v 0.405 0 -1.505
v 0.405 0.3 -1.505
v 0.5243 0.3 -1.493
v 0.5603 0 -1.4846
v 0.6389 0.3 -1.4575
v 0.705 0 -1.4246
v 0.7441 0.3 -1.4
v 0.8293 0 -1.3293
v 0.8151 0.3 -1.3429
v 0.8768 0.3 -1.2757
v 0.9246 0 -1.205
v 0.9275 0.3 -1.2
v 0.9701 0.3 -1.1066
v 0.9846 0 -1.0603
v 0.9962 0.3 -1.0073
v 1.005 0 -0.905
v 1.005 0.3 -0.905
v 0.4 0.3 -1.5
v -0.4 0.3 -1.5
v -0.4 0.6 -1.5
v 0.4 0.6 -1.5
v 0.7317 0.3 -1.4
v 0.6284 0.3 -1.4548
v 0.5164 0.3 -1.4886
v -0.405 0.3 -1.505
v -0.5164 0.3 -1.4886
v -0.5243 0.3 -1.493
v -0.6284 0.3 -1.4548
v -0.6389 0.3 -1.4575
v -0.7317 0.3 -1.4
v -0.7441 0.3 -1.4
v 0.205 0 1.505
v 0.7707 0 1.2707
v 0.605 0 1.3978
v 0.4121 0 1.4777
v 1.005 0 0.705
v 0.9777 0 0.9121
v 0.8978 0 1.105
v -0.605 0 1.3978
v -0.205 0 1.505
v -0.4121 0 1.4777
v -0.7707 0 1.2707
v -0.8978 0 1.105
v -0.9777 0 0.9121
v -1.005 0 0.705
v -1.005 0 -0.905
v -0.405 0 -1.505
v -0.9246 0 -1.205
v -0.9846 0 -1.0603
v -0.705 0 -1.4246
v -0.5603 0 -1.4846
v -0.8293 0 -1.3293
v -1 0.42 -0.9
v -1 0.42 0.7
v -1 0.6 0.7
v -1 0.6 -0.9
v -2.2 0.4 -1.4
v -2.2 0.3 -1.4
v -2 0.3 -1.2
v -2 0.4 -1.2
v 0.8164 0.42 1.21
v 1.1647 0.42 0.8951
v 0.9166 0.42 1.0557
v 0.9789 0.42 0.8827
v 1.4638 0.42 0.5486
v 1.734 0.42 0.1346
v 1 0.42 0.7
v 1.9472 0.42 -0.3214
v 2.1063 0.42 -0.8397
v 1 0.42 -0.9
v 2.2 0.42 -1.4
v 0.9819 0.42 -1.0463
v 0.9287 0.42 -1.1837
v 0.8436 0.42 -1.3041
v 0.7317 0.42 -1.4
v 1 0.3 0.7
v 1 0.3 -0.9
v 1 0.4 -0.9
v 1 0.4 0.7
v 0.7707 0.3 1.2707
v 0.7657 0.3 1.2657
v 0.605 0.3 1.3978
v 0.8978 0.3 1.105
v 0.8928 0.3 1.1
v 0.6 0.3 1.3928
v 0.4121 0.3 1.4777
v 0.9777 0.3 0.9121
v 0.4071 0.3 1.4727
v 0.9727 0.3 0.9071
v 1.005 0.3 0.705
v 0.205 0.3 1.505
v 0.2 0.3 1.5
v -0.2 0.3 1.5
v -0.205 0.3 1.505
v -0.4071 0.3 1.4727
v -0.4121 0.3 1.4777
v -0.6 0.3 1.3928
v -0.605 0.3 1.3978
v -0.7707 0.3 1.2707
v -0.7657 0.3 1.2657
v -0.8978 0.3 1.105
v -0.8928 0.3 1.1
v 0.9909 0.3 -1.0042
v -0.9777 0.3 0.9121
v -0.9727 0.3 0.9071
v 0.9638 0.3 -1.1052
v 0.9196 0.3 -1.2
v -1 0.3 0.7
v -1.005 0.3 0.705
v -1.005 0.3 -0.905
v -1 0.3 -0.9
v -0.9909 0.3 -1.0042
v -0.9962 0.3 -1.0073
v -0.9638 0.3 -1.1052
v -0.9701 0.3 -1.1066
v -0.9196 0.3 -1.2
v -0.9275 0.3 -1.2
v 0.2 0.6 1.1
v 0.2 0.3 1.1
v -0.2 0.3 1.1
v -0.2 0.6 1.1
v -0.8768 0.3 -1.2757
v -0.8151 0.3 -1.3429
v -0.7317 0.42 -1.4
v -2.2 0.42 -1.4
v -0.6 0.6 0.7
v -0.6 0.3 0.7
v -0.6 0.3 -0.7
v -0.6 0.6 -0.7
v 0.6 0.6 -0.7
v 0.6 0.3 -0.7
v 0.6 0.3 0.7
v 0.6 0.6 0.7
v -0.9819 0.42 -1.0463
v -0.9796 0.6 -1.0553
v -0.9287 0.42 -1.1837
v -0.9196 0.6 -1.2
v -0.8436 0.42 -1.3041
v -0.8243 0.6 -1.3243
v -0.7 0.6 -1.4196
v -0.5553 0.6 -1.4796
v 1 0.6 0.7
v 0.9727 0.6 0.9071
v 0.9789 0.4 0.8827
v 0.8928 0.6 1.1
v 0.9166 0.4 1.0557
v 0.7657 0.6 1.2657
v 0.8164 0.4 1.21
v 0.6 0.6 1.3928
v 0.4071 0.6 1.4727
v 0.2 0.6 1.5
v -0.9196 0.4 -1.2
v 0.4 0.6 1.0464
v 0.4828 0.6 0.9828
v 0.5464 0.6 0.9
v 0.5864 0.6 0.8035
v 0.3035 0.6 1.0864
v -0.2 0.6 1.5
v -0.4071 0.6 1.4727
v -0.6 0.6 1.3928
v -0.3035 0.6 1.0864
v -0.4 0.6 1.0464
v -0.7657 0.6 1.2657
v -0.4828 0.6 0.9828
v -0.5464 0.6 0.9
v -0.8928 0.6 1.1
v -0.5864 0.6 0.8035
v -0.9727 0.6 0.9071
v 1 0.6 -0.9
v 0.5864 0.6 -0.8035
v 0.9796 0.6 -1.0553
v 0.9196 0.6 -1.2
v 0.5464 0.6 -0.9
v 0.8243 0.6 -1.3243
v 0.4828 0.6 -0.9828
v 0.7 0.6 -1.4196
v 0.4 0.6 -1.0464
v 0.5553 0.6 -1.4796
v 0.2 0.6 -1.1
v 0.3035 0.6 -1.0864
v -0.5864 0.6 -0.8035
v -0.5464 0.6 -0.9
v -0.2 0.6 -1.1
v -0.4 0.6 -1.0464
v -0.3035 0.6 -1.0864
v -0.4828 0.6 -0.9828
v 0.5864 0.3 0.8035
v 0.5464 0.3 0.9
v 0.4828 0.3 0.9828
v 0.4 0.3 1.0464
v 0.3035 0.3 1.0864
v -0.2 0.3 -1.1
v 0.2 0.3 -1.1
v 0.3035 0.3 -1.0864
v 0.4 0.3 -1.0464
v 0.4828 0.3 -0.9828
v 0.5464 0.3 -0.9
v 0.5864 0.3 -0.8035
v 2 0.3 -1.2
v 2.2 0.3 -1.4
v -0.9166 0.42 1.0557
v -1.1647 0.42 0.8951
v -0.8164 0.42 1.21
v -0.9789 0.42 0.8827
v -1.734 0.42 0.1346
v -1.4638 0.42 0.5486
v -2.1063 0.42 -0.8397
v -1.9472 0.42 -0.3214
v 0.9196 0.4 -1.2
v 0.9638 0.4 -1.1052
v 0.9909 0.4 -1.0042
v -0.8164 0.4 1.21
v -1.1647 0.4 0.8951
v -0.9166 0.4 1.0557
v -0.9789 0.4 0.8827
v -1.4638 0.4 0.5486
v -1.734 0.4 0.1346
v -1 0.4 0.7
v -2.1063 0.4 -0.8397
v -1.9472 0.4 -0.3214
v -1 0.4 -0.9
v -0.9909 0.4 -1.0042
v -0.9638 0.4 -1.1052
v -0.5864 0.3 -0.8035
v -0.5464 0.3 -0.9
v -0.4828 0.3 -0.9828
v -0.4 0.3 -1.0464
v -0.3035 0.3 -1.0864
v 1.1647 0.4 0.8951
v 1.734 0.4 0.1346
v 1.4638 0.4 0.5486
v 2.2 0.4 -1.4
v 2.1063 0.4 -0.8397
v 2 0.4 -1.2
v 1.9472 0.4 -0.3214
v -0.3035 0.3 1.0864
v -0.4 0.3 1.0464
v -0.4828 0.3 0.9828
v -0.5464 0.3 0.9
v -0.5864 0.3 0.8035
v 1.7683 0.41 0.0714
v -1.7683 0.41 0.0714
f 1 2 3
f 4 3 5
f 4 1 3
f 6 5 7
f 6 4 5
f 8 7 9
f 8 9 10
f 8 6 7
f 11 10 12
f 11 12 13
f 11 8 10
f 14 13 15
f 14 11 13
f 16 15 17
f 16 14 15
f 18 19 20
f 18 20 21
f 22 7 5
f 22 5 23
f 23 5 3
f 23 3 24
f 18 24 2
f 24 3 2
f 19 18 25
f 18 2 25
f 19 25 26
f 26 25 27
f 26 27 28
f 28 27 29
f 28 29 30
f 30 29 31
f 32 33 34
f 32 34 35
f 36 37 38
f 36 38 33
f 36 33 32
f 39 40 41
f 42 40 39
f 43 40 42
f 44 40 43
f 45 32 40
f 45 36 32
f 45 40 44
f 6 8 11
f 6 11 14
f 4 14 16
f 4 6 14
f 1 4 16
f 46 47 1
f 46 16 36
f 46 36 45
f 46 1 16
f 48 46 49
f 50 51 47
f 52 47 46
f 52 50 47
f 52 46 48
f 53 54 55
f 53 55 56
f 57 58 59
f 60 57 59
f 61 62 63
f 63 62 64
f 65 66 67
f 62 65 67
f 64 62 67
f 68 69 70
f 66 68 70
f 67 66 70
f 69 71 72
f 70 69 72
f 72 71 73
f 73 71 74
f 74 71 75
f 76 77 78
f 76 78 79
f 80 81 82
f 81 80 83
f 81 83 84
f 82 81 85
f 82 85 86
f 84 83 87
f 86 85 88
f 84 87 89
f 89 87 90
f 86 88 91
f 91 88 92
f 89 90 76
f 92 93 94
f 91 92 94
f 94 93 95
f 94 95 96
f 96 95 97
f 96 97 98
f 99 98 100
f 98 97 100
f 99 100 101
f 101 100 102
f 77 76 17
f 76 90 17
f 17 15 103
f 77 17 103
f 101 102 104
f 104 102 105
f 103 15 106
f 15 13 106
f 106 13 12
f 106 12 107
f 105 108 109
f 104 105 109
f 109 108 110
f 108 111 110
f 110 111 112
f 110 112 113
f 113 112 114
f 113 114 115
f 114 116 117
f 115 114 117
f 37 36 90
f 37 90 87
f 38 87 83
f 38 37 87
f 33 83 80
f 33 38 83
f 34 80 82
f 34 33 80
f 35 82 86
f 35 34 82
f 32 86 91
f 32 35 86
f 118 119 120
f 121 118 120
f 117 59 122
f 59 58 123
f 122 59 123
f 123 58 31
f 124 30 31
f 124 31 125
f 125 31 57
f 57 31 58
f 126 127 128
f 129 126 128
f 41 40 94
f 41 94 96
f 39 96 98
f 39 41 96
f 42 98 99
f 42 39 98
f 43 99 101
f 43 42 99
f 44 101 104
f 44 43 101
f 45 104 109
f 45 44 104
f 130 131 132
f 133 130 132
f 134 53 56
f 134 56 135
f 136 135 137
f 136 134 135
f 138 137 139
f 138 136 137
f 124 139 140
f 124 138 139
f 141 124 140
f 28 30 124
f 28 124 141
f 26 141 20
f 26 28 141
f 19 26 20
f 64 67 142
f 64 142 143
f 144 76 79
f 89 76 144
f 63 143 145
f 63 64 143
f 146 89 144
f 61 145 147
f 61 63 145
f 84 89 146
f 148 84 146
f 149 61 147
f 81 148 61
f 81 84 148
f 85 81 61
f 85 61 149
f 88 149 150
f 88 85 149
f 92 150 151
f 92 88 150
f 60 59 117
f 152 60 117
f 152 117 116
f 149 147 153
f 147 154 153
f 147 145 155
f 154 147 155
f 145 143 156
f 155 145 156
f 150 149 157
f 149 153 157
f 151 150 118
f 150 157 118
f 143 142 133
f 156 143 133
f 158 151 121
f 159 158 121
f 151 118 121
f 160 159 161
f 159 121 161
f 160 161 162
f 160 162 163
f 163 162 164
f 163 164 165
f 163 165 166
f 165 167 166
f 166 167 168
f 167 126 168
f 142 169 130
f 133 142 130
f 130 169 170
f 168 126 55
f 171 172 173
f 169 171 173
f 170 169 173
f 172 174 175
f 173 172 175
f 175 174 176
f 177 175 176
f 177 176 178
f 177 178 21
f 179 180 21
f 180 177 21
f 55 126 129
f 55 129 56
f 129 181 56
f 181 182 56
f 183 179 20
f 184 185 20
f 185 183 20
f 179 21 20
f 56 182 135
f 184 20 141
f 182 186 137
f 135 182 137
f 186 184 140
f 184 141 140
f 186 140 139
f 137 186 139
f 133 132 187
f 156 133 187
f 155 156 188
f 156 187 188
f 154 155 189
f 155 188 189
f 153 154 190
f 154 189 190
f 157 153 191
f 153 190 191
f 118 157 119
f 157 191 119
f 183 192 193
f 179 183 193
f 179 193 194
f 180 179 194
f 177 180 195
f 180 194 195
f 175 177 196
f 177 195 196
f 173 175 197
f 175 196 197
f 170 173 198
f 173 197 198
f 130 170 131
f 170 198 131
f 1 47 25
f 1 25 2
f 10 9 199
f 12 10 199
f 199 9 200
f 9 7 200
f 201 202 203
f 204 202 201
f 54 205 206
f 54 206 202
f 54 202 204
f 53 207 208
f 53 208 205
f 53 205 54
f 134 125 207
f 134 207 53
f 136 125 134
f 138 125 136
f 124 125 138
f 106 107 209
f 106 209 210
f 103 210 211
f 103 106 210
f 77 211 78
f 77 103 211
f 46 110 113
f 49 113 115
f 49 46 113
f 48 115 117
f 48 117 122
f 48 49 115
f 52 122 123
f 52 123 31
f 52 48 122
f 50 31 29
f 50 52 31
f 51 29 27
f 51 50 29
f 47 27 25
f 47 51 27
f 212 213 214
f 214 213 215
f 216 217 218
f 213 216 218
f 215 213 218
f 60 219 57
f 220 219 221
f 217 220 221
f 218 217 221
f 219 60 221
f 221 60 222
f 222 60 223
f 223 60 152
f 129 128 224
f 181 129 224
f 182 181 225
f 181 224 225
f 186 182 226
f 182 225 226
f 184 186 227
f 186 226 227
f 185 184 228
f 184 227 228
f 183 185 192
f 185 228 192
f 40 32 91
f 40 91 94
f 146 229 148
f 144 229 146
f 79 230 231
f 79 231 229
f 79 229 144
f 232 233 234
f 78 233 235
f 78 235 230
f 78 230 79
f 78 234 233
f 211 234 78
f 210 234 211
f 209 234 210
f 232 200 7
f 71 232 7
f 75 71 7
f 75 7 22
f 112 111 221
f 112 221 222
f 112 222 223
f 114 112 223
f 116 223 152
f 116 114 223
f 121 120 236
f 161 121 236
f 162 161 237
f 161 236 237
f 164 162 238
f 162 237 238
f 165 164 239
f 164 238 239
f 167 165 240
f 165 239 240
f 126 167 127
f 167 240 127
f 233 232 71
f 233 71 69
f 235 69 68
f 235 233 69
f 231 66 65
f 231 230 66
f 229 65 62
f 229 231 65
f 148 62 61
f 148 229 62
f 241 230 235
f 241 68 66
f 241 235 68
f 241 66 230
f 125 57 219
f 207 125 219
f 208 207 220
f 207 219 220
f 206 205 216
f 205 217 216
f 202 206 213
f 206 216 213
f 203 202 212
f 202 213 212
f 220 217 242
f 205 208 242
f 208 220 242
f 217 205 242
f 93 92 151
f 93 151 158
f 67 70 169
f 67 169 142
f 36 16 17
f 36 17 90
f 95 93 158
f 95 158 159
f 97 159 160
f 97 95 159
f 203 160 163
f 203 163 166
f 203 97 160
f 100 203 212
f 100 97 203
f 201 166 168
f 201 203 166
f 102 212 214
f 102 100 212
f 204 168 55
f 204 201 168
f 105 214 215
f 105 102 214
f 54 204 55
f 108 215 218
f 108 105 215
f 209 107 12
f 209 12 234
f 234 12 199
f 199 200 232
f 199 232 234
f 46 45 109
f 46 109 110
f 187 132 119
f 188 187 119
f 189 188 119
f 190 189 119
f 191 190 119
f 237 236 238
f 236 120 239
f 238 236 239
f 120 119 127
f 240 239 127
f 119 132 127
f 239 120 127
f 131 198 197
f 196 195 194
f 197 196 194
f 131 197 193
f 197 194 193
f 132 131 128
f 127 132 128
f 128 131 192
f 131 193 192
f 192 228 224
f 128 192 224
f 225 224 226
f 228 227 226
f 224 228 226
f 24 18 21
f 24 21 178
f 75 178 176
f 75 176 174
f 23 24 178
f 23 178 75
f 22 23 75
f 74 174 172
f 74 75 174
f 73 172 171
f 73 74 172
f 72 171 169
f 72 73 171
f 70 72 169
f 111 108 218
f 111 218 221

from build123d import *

# Parameters (mm, degrees)
EXTRUDE_1_DEPTH = 3
SKETCH_2_W      = 2
SKETCH_2_H      = 22
EXTRUDE_2_DEPTH = 1
EXTRUDE_3_DEPTH = 0.2
EXTRUDE_4_DEPTH = 3
SCALE_1_SCALE   = 0.1


with BuildPart() as part:
    # 草图1 → 凸台-拉伸1 (new body)
    with BuildSketch(Plane(origin=(0, 0, 0), x_dir=(1, 0, 0), z_dir=(0, 1, 0))):
        with BuildLine():
            Line((-4.05, 15.05), (4.05, 15.05))
            ThreePointArc((4.05, 15.05), (8.292640687, 13.292640687), (10.05, 9.05))
            Line((10.05, 9.05), (10.05, -7.05))
            ThreePointArc((10.05, -7.05), (7.706854249, -12.706854249), (2.05, -15.05))
            Line((2.05, -15.05), (-2.05, -15.05))
            ThreePointArc((-2.05, -15.05), (-7.706854249, -12.706854249), (-10.05, -7.05))
            Line((-10.05, -7.05), (-10.05, 9.05))
            ThreePointArc((-10.05, 9.05), (-8.292640687, 13.292640687), (-4.05, 15.05))
        make_face()
    extrude(amount=EXTRUDE_1_DEPTH)

    # 草图2 → 凸台-拉伸2 (add)
    with BuildSketch(Plane(origin=(0, 3, 0), x_dir=(1, 0, 0), z_dir=(0, 1, 0))):
        with Locations((-8, 1)):
            Rectangle(SKETCH_2_W, SKETCH_2_H)
        with BuildLine():
            Line((-9, 12), (-7, 12))
            Line((-7, 12), (-2, 12))
            Line((-2, 12), (-2, 14))
            Line((-2, 14), (-7.440796367, 14))
            ThreePointArc((-7.440796367, 14), (-8.472295614, 13.105034094), (-9.274700948, 12))
            Line((-9.274700948, 12), (-9, 12))
        make_face()
        with BuildLine():
            Line((-20, 12), (-9.274700948, 12))
            ThreePointArc((-9.274700948, 12), (-8.472295614, 13.105034094), (-7.440796367, 14))
            Line((-7.440796367, 14), (-20, 14))
            Line((-20, 14), (-20, 12))
        make_face()
        Polygon((-20, 14), (-22, 14), (-20, 12), align=None)
        Polygon((-7, -13), (-9, -10), (-7, -10), align=None)
        with BuildLine():
            ThreePointArc((9.274700948, 12), (8.472295614, 13.105034094), (7.440796367, 14))
            Line((7.440796367, 14), (2, 14))
            Line((2, 14), (2, 12))
            Line((2, 12), (7, 12))
            Line((7, 12), (9, 12))
            Line((9, 12), (9.274700948, 12))
        make_face()
        with BuildLine():
            Line((20, 12), (20, 14))
            Line((20, 14), (7.440796367, 14))
            ThreePointArc((7.440796367, 14), (8.472295614, 13.105034094), (9.274700948, 12))
            Line((9.274700948, 12), (20, 12))
        make_face()
        Polygon((20, 12), (20, 14), (22, 14), align=None)
        with Locations((8, 1)):
            Rectangle(SKETCH_2_W, SKETCH_2_H)
        Polygon((7, -10), (9, -10), (7, -13), align=None)
    extrude(amount=EXTRUDE_2_DEPTH)

    # 草图3 → 凸台-拉伸3 (add)
    with BuildSketch(Plane(origin=(0, 4, 0), x_dir=(1, 0, 0), z_dir=(0, 1, 0))):
        with BuildLine():
            Line((-7, -13), (-7, 14))
            Line((-7, 14), (-22, 14))
            add(Edge.make_bspline(
                [(-22, 14), (-20.203305703, -3.149159716), (-7, -13)],
                knots=[0, 0, 0, 1, 1, 1], degree=2))
        make_face()
        with BuildLine():
            Line((7, -13), (7, 14))
            Line((7, 14), (22, 14))
            add(Edge.make_bspline(
                [(22, 14), (20.203305703, -3.149159716), (7, -13)],
                knots=[0, 0, 0, 1, 1, 1], degree=2))
        make_face()
    extrude(amount=EXTRUDE_3_DEPTH)

    # 草图4 → 凸台-拉伸4 (add)
    with BuildSketch(Plane(origin=(0, 3, 0), x_dir=(1, 0, 0), z_dir=(0, 1, 0))):
        with BuildLine():
            Line((-4, 15), (4, 15))
            ThreePointArc((4, 15), (8.242640687, 13.242640687), (10, 9))
            Line((10, 9), (10, -7))
            ThreePointArc((10, -7), (7.656854249, -12.656854249), (2, -15))
            Line((2, -15), (-2, -15))
            ThreePointArc((-2, -15), (-7.656854249, -12.656854249), (-10, -7))
            Line((-10, -7), (-10, 9))
            ThreePointArc((-10, 9), (-8.242640687, 13.242640687), (-4, 15))
        make_face()
        with BuildLine():
            Line((-2, 11), (2, 11))
            ThreePointArc((2, 11), (4.828427125, 9.828427125), (6, 7))
            Line((6, 7), (6, -7))
            ThreePointArc((6, -7), (4.828427125, -9.828427125), (2, -11))
            Line((2, -11), (-2, -11))
            ThreePointArc((-2, -11), (-4.828427125, -9.828427125), (-6, -7))
            Line((-6, -7), (-6, 7))
            ThreePointArc((-6, 7), (-4.828427125, 9.828427125), (-2, 11))
        make_face(mode=Mode.SUBTRACT)
    extrude(amount=EXTRUDE_4_DEPTH)


with BuildPart() as part_1:
    # 缩放比例1: scaled about (0, 0, 0)
    add(part.part.scale(SCALE_1_SCALE))


solid = part_1.part
